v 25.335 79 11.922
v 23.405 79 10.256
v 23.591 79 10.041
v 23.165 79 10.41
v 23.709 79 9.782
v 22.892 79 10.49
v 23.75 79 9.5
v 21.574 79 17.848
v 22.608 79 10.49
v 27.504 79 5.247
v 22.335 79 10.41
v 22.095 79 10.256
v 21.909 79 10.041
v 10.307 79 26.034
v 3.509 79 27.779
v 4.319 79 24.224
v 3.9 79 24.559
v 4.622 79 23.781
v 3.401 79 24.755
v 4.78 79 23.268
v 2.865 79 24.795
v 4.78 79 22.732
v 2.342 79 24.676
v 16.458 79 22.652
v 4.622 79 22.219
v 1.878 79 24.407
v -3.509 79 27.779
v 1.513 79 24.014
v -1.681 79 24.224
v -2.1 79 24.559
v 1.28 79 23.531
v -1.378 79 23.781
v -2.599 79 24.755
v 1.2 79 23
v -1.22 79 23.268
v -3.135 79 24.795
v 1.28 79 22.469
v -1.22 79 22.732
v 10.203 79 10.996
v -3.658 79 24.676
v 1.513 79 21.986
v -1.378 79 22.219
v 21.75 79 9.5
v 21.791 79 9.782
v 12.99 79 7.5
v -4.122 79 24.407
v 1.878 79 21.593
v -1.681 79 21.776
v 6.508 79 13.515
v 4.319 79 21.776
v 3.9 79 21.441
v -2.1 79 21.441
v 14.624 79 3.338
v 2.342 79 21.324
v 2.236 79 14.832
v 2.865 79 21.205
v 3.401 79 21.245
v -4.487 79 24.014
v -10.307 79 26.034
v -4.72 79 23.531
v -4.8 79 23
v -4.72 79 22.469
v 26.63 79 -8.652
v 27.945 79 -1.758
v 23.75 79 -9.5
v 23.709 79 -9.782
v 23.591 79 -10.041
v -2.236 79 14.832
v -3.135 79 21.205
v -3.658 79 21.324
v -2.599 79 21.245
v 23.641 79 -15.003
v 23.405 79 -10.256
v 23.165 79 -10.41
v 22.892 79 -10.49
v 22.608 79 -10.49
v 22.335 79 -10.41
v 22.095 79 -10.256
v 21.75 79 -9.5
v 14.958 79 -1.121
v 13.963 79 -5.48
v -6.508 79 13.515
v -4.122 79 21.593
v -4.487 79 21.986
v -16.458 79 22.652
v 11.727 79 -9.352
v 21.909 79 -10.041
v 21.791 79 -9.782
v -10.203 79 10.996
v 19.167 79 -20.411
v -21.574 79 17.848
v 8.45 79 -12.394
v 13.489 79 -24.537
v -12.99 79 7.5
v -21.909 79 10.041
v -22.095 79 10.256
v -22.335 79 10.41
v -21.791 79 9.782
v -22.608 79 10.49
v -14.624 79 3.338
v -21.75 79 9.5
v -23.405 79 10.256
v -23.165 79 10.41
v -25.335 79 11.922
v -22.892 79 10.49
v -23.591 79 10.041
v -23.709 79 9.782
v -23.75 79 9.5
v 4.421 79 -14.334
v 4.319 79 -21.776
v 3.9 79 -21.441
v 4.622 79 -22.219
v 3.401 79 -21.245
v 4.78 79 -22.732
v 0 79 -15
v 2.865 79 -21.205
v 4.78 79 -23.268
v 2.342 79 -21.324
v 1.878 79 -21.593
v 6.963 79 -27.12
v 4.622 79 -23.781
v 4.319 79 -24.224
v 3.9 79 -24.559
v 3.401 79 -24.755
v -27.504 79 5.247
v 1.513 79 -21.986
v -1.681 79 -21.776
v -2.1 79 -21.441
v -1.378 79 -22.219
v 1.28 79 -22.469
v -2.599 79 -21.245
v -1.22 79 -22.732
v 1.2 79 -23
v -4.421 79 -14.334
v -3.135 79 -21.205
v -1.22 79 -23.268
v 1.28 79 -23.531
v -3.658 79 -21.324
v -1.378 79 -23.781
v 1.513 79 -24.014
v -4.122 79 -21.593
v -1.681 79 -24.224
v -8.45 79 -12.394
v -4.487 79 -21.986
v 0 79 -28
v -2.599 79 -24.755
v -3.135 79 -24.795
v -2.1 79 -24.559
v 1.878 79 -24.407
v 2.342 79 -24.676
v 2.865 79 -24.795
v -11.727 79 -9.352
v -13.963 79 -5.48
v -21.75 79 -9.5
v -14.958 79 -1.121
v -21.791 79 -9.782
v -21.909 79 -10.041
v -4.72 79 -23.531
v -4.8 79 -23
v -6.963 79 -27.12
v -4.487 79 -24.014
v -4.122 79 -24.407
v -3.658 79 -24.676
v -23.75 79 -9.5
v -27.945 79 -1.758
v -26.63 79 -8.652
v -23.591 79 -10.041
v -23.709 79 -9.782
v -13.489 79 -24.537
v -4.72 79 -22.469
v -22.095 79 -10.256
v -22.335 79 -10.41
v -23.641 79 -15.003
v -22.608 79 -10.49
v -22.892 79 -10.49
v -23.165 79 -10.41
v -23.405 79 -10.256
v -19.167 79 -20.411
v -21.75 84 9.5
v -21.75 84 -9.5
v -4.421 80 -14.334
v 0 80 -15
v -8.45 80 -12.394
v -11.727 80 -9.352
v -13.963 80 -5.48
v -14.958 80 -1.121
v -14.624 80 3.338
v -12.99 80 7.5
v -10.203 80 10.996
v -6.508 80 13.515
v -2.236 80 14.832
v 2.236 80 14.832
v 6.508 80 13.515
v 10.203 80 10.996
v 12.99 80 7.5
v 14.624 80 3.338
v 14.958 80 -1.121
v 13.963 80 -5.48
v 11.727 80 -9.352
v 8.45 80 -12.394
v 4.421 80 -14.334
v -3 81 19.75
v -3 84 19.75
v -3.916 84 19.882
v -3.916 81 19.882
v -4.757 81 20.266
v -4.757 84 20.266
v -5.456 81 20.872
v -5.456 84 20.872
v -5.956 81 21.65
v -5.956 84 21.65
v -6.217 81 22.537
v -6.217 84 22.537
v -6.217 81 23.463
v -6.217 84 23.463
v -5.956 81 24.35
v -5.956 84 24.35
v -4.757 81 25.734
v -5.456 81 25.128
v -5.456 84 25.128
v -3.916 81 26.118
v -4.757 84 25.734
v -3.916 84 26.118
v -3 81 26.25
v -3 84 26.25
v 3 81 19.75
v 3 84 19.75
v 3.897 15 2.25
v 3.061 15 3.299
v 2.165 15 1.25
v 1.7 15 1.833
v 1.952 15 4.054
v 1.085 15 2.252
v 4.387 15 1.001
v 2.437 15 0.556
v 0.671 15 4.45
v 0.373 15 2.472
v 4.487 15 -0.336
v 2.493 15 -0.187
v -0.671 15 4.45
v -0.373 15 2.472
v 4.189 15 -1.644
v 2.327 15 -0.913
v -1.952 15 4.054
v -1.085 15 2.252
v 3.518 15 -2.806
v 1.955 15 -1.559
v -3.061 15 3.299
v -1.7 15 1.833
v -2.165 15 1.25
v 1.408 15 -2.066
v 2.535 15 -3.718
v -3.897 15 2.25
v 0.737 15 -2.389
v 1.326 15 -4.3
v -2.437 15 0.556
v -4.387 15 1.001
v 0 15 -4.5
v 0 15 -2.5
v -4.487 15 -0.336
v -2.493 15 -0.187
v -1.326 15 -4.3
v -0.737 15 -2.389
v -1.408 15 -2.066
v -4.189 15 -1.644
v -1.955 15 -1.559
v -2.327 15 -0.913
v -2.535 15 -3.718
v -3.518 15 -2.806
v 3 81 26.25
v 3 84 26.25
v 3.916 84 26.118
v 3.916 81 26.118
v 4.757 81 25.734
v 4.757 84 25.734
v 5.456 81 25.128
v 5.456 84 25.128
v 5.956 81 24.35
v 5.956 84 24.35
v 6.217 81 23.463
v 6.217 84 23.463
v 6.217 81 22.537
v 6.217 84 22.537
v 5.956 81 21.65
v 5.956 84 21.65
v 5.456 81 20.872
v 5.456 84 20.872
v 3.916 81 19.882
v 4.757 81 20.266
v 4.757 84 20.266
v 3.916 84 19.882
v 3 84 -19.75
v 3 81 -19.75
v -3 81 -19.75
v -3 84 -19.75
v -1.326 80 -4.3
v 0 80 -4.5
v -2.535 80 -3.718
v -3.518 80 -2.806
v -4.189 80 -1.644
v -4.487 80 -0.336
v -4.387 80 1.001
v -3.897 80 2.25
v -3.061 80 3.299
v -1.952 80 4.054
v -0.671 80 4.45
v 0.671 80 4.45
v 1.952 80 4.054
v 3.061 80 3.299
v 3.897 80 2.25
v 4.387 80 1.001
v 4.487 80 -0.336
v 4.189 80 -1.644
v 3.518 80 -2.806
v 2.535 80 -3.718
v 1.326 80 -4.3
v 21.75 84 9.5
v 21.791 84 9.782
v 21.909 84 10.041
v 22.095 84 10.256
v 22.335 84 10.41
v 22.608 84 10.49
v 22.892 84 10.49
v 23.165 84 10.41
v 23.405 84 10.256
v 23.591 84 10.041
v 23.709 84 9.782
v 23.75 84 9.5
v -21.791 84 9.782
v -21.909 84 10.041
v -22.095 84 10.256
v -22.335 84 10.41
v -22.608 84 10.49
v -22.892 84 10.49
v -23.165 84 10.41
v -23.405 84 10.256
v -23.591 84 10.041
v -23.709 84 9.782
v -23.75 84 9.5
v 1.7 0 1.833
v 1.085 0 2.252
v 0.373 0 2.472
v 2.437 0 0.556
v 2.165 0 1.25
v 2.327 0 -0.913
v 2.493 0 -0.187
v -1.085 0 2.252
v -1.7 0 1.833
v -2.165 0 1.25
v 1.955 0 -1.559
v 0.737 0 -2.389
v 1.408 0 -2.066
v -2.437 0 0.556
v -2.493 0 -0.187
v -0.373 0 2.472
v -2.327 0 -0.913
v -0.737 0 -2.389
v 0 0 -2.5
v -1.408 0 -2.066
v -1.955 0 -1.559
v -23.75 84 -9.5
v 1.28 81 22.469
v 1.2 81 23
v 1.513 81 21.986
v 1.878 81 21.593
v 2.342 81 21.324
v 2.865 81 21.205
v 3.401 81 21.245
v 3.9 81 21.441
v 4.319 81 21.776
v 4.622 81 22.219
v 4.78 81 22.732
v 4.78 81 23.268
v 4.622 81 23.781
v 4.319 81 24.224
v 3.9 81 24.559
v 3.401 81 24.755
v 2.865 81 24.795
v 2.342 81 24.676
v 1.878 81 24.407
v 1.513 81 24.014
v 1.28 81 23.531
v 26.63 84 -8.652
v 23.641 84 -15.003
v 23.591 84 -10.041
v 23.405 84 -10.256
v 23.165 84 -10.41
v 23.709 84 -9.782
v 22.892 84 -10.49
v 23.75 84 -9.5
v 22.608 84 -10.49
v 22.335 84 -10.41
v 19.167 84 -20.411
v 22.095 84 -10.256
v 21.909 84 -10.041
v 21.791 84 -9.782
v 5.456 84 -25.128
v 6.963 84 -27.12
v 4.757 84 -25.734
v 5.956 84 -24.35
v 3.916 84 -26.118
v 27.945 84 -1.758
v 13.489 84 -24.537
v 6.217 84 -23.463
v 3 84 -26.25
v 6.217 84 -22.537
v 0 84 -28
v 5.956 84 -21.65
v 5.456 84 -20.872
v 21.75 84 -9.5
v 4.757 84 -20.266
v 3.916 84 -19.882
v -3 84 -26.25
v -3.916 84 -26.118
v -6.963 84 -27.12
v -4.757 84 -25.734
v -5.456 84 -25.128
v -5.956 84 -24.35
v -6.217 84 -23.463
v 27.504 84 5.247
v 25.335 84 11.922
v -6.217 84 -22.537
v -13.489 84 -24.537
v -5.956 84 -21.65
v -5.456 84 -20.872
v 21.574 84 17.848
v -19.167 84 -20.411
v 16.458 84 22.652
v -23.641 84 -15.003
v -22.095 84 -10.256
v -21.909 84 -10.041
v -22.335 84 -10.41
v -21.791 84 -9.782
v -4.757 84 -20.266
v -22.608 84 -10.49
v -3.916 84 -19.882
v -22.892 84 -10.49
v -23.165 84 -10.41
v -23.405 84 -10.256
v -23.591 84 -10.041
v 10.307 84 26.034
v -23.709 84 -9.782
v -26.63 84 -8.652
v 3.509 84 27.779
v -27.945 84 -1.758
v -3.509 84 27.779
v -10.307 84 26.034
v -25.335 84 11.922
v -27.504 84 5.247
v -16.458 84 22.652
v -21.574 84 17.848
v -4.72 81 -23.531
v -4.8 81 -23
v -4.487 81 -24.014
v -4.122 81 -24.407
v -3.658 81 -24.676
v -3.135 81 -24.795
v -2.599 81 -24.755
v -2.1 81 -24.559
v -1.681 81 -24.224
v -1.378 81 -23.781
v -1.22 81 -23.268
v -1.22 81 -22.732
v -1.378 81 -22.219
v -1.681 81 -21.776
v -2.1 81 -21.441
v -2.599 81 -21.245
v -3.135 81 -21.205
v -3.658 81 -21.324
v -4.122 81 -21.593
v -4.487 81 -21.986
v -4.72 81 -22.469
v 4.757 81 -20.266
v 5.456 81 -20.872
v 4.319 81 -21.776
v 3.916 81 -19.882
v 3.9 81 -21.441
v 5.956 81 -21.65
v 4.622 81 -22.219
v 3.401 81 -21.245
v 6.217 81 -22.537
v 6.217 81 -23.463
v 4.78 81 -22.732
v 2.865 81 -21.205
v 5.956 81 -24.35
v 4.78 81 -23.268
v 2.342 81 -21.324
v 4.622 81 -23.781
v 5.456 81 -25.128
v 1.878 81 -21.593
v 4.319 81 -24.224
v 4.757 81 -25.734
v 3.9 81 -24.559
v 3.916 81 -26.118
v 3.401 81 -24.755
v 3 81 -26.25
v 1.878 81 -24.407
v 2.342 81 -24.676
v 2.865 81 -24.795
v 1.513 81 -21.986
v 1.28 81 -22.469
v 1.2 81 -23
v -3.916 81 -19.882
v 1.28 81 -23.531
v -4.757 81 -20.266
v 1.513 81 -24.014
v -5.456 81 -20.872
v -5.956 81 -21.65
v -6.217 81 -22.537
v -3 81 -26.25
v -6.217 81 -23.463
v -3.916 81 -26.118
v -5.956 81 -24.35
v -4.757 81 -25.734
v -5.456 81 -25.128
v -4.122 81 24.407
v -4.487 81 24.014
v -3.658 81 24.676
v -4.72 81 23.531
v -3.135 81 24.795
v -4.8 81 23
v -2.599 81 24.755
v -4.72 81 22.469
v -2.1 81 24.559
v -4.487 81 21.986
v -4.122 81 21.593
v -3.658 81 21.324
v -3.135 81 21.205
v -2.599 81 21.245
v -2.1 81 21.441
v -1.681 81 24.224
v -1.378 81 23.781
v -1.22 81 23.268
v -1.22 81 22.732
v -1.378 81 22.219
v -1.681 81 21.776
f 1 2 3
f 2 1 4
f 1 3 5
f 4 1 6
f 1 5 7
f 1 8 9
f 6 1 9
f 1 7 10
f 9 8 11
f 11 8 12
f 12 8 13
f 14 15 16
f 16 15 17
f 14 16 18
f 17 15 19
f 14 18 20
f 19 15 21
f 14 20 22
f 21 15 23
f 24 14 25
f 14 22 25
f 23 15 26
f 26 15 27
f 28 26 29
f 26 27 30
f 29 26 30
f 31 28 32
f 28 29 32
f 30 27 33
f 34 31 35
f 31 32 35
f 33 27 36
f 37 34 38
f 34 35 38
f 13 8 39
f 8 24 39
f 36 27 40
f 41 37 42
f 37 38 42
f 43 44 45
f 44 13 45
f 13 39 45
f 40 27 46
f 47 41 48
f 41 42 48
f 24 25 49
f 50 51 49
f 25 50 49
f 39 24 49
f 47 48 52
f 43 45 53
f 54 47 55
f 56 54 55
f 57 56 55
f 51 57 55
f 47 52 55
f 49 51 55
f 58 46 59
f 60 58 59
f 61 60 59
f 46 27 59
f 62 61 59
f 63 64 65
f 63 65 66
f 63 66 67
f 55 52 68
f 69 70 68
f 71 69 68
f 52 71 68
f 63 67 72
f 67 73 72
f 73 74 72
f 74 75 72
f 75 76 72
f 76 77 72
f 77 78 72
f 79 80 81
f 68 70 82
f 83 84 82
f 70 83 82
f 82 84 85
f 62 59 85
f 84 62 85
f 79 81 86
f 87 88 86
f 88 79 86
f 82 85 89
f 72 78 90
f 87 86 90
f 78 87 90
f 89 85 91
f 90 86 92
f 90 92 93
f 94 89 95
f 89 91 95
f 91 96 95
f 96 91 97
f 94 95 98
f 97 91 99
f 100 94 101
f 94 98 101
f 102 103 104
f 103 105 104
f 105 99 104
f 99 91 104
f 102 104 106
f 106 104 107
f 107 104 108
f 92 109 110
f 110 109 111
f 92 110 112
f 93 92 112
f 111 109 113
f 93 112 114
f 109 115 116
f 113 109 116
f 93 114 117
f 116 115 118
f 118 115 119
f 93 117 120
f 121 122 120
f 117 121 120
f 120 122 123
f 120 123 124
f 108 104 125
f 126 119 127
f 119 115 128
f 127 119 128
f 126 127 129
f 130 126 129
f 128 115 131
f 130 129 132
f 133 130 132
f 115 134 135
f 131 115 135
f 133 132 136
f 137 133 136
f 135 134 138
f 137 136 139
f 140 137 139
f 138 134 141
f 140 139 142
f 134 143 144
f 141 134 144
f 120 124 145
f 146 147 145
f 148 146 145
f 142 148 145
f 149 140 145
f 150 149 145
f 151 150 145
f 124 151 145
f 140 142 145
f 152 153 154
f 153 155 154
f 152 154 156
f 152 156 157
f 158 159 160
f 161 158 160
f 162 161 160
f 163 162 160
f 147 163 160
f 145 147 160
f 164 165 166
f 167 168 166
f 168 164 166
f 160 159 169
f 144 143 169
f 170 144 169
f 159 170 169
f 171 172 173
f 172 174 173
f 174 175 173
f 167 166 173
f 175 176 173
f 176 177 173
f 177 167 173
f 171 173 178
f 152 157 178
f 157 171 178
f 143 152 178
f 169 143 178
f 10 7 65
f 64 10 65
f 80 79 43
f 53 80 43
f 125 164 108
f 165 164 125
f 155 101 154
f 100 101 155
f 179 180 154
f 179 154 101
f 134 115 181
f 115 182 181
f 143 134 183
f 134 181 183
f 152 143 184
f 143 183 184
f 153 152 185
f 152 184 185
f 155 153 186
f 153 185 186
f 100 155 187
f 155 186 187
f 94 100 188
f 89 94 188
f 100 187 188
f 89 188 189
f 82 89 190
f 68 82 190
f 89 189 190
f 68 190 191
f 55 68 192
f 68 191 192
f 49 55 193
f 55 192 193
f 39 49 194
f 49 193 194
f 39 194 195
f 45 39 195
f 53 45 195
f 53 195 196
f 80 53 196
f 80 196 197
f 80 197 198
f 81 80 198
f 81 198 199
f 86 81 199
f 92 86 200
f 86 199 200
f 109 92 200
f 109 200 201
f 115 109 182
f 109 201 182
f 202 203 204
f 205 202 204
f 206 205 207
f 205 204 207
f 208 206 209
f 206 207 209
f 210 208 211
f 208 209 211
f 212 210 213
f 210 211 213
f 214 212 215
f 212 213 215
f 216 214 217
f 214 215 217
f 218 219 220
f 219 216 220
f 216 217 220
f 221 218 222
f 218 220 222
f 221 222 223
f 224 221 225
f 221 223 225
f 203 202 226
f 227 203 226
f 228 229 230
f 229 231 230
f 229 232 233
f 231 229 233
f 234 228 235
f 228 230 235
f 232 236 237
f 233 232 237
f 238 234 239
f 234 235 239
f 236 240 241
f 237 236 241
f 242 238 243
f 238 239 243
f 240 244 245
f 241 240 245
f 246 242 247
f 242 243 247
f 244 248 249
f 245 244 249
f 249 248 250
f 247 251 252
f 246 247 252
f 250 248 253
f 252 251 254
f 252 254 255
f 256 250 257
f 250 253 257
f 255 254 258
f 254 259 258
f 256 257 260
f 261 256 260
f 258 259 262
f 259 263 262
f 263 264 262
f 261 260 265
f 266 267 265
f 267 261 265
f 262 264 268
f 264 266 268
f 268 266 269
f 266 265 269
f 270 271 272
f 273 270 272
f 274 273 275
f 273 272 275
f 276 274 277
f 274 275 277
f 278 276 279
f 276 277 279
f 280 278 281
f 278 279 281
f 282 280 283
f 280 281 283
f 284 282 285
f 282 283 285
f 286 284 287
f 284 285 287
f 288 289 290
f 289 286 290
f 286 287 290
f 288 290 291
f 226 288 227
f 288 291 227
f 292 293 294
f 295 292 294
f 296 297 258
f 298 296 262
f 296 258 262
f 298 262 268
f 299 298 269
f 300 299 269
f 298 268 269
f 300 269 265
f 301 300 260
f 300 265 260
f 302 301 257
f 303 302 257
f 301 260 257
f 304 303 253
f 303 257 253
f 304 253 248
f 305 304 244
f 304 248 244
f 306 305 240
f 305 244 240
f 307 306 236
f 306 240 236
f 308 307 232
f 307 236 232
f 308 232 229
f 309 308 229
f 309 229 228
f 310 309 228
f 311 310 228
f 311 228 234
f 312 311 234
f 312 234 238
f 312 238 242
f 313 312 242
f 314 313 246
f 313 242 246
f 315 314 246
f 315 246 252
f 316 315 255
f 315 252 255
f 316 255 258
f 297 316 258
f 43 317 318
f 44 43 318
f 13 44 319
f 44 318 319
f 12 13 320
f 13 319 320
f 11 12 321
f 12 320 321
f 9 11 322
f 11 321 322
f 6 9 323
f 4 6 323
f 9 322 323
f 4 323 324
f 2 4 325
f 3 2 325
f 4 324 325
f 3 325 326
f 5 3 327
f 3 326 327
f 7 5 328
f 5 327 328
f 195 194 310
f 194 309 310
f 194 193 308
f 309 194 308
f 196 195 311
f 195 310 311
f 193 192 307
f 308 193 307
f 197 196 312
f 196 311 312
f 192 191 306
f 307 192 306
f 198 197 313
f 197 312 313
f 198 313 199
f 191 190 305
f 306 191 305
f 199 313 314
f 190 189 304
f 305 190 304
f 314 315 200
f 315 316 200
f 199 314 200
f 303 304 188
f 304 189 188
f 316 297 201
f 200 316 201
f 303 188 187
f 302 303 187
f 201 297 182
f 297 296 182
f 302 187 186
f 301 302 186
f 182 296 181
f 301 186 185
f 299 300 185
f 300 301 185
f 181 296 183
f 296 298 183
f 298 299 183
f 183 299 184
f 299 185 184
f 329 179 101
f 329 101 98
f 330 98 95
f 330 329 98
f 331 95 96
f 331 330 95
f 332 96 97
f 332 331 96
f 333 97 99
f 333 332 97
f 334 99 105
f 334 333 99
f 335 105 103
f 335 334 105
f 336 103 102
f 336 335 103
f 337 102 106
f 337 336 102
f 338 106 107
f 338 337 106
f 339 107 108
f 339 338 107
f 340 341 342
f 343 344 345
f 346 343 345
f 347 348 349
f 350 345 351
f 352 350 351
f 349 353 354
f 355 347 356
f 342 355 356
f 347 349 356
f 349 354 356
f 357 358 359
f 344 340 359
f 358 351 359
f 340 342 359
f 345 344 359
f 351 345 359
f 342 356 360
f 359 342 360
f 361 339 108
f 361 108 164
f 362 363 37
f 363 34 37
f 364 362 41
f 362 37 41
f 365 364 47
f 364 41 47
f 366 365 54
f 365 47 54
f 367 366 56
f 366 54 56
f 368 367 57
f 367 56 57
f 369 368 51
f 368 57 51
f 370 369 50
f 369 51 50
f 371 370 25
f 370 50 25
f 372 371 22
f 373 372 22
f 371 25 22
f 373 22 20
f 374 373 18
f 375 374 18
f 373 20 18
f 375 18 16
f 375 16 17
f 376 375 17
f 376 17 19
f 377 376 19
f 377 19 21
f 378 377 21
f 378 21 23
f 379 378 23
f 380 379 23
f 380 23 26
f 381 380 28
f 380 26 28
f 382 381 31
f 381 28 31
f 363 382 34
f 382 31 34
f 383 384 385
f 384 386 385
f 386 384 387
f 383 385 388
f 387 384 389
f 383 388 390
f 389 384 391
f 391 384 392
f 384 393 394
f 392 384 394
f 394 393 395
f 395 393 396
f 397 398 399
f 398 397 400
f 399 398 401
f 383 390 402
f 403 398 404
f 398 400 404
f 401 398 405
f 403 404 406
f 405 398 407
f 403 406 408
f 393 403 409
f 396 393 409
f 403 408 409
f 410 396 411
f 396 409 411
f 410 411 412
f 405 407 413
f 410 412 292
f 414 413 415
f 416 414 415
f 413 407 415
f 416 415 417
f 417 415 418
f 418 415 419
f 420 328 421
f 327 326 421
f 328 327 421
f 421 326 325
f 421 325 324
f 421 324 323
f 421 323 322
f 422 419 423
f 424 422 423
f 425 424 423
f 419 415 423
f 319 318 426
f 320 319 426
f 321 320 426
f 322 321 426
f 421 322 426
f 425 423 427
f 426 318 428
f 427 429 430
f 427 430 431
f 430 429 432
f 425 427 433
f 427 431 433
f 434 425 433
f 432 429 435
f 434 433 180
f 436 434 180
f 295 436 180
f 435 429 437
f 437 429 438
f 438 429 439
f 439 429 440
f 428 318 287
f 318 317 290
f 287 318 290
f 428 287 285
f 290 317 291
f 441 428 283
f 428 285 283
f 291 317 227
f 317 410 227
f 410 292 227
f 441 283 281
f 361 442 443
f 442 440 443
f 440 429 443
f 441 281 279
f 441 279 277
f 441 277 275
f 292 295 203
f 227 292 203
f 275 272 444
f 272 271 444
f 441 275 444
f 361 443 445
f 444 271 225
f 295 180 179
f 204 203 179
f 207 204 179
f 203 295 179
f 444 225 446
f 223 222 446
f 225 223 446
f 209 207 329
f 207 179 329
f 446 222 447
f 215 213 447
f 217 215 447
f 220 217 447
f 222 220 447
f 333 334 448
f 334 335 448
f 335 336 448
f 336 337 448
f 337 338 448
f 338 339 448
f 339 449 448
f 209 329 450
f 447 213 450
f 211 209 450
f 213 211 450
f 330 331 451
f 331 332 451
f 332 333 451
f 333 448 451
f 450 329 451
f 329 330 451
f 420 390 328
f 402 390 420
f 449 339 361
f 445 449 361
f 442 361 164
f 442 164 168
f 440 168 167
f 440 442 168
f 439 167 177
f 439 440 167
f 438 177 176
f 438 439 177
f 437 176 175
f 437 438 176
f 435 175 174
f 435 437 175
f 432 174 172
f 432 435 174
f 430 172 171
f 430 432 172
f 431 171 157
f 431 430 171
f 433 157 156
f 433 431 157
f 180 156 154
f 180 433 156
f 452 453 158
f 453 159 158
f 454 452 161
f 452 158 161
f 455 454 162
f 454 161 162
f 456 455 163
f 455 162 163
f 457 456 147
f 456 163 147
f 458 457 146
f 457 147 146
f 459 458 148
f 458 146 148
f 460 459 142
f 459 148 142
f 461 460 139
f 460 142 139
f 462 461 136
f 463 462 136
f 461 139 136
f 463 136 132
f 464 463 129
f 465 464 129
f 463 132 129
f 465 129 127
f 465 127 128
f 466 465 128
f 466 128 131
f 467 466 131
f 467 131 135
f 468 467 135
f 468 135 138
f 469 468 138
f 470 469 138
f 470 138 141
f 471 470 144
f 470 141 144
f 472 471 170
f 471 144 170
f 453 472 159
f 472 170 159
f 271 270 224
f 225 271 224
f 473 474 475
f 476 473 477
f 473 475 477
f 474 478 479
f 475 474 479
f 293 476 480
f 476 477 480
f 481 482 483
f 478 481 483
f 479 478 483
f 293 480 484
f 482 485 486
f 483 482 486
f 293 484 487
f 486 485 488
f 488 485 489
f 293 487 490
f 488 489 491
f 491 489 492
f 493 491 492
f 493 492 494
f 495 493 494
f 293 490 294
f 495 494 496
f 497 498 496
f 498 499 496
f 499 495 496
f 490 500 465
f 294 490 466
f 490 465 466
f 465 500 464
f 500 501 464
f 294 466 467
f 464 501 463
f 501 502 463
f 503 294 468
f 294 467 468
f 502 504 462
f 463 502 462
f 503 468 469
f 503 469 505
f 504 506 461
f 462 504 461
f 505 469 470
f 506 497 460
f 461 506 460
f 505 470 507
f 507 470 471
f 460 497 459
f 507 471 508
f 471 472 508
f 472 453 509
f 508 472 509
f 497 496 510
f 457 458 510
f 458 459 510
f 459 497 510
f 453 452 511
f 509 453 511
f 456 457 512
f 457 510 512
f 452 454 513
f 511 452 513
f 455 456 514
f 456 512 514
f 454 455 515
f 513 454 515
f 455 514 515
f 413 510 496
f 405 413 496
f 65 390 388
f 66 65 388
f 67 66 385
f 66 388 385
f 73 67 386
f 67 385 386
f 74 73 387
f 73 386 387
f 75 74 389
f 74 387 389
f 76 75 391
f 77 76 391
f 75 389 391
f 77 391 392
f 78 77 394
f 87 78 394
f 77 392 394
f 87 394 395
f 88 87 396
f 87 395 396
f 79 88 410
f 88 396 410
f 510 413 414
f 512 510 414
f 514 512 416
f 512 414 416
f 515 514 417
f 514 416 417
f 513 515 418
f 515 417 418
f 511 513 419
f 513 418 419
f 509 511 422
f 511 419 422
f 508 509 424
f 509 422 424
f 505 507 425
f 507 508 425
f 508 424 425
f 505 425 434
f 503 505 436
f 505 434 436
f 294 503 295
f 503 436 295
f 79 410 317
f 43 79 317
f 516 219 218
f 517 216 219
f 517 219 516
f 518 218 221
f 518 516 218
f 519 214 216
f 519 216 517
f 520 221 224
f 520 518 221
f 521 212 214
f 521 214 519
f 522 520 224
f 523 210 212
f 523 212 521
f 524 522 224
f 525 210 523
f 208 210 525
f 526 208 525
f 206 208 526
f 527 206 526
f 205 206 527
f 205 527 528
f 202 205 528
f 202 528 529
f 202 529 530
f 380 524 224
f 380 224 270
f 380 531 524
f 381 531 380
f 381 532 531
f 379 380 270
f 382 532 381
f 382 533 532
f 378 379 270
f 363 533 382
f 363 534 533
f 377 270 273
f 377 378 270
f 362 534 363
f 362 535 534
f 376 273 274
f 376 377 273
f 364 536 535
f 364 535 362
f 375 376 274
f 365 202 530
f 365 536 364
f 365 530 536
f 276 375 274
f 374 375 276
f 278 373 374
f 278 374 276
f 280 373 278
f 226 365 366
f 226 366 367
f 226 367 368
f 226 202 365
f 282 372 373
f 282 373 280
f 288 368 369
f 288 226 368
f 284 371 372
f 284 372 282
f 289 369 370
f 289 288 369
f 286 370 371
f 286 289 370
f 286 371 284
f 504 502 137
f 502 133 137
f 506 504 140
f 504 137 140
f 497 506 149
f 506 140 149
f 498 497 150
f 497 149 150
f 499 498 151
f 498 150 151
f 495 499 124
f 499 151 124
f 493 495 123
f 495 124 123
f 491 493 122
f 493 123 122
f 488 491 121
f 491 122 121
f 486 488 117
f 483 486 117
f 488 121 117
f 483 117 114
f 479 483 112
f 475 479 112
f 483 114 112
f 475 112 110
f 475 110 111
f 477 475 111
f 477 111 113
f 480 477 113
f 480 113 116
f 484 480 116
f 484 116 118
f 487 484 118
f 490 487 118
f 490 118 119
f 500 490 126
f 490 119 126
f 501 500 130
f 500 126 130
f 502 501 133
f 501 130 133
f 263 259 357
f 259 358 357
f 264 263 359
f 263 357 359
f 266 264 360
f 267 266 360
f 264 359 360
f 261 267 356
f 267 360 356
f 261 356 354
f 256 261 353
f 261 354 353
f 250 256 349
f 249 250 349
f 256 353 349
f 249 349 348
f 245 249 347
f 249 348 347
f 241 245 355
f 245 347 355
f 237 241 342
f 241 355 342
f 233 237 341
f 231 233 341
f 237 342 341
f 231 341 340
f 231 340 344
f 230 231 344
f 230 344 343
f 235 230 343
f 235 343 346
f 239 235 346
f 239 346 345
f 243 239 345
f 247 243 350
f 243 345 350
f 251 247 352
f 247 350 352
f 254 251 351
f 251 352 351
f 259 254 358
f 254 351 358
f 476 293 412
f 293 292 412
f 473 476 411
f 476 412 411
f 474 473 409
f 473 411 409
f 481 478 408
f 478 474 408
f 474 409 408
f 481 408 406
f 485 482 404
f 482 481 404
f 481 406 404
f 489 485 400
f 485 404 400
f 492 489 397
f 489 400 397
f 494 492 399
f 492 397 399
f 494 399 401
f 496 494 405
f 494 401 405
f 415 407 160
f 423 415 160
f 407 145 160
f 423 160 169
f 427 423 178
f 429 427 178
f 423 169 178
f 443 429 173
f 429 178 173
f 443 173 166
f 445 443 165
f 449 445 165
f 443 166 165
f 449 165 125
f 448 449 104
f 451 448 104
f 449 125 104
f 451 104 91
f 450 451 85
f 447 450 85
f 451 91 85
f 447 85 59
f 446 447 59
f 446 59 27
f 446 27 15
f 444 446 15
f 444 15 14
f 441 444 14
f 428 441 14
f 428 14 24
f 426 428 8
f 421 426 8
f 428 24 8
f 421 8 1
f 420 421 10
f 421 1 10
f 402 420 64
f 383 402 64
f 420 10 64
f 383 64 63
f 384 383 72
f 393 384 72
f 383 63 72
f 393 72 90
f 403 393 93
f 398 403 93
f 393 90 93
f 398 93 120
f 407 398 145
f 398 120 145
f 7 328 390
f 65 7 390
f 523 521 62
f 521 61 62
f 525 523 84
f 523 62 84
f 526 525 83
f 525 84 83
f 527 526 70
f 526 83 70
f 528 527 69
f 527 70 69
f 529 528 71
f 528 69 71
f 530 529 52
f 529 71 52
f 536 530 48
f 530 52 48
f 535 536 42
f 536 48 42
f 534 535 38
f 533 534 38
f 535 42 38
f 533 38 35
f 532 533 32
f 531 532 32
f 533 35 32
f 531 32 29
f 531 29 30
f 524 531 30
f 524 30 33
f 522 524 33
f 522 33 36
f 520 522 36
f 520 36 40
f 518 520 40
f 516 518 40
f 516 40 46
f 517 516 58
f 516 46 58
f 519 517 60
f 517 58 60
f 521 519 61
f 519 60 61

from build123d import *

# Parameters (mm, degrees)
CBORE_FOR_M3_SHCS1_D           = 3.6
CBORE_FOR_M3_SHCS1_DEPTH       = 6.500114
CBORE_FOR_M3_SHCS1_CBORE_D     = 6.5
CBORE_FOR_M3_SHCS1_CBORE_DEPTH = 3
CBORE_FOR_M3_SHCS1_TIP         = 1.081549114
CUT_EXTRUDE1_DEPTH             = 91.160967098
CUT_EXTRUDE2_DEPTH             = 93.865494063


with BuildPart() as part:
    # Sketch1 → Revolve1 (revolve)
    with BuildSketch(Plane.XY, mode=Mode.PRIVATE) as revolve1_sk:
        Polygon((0, 83.999999926), (28, 83.999999926), (28, 78.999999926), (15, 78.999999926), (15, 79.999999926), (4.5, 79.999999926), (4.5, 15), (2.5, 15), (2.5, 0), (0, 0), align=None)
    revolve(revolve1_sk.sketch.rotate(Axis((0, 0, 0), (0, 1, 0)), 90), axis=Axis((0, 0, 0), (0, 1, 0)))

    # CBORE for M3 SHCS1
    with Locations(Plane(origin=(0, 83.999999926, 0), x_dir=(1, 0, 0), z_dir=(0, 1, 0))):
        with Locations((3, 23), (-3, 23), (-3, -23), (3, -23)):
            CounterBoreHole(CBORE_FOR_M3_SHCS1_D / 2, CBORE_FOR_M3_SHCS1_CBORE_D / 2, CBORE_FOR_M3_SHCS1_CBORE_DEPTH, depth=CBORE_FOR_M3_SHCS1_DEPTH)
            with Locations((0, 0, -(CBORE_FOR_M3_SHCS1_DEPTH + CBORE_FOR_M3_SHCS1_TIP / 2))):  # 118° drill point
                Cone(0, CBORE_FOR_M3_SHCS1_D / 2, CBORE_FOR_M3_SHCS1_TIP, mode=Mode.SUBTRACT)

    # Sketch4 → Cut-Extrude1 (cut, through all)
    with BuildSketch(Plane(origin=(0, 80.999999926, 0), x_dir=(1, 0, 0), z_dir=(0, 1, 0))):
        with BuildLine():
            Line((-3, 26.25), (3, 26.25))
            ThreePointArc((3, 26.25), (6.25, 23), (3, 19.75))
            Line((3, 19.75), (-3, 19.75))
            ThreePointArc((-3, 19.75), (-6.25, 23), (-3, 26.25))
        make_face()
        with BuildLine():
            Line((-3, -19.75), (3, -19.75))
            ThreePointArc((3, -19.75), (6.25, -23), (3, -26.25))
            Line((3, -26.25), (-3, -26.25))
            ThreePointArc((-3, -26.25), (-6.25, -23), (-3, -19.75))
        make_face()
    extrude(amount=CUT_EXTRUDE1_DEPTH, mode=Mode.SUBTRACT)

    # Sketch5 → Cut-Extrude2 (cut, through all)
    with BuildSketch(Plane(origin=(0, 83.999999926, 0), x_dir=(1, 0, 0), z_dir=(0, 1, 0))):
        with BuildLine():
            Line((-23.75, -9.5), (-23.75, 9.5))
            ThreePointArc((-23.75, 9.5), (-22.75, 10.5), (-21.75, 9.5))
            Line((-21.75, 9.5), (-21.75, -9.5))
            ThreePointArc((-21.75, -9.5), (-22.75, -10.5), (-23.75, -9.5))
        make_face()
    cut_extrude2 = extrude(amount=-CUT_EXTRUDE2_DEPTH, mode=Mode.SUBTRACT)

    # Mirror1: Cut-Extrude2 across plane
    add(cut_extrude2.mirror(Plane(origin=(0, 0, 0), x_dir=(0, 0, 1), z_dir=(1, 0, 0))), mode=Mode.SUBTRACT)


solid = part.part
